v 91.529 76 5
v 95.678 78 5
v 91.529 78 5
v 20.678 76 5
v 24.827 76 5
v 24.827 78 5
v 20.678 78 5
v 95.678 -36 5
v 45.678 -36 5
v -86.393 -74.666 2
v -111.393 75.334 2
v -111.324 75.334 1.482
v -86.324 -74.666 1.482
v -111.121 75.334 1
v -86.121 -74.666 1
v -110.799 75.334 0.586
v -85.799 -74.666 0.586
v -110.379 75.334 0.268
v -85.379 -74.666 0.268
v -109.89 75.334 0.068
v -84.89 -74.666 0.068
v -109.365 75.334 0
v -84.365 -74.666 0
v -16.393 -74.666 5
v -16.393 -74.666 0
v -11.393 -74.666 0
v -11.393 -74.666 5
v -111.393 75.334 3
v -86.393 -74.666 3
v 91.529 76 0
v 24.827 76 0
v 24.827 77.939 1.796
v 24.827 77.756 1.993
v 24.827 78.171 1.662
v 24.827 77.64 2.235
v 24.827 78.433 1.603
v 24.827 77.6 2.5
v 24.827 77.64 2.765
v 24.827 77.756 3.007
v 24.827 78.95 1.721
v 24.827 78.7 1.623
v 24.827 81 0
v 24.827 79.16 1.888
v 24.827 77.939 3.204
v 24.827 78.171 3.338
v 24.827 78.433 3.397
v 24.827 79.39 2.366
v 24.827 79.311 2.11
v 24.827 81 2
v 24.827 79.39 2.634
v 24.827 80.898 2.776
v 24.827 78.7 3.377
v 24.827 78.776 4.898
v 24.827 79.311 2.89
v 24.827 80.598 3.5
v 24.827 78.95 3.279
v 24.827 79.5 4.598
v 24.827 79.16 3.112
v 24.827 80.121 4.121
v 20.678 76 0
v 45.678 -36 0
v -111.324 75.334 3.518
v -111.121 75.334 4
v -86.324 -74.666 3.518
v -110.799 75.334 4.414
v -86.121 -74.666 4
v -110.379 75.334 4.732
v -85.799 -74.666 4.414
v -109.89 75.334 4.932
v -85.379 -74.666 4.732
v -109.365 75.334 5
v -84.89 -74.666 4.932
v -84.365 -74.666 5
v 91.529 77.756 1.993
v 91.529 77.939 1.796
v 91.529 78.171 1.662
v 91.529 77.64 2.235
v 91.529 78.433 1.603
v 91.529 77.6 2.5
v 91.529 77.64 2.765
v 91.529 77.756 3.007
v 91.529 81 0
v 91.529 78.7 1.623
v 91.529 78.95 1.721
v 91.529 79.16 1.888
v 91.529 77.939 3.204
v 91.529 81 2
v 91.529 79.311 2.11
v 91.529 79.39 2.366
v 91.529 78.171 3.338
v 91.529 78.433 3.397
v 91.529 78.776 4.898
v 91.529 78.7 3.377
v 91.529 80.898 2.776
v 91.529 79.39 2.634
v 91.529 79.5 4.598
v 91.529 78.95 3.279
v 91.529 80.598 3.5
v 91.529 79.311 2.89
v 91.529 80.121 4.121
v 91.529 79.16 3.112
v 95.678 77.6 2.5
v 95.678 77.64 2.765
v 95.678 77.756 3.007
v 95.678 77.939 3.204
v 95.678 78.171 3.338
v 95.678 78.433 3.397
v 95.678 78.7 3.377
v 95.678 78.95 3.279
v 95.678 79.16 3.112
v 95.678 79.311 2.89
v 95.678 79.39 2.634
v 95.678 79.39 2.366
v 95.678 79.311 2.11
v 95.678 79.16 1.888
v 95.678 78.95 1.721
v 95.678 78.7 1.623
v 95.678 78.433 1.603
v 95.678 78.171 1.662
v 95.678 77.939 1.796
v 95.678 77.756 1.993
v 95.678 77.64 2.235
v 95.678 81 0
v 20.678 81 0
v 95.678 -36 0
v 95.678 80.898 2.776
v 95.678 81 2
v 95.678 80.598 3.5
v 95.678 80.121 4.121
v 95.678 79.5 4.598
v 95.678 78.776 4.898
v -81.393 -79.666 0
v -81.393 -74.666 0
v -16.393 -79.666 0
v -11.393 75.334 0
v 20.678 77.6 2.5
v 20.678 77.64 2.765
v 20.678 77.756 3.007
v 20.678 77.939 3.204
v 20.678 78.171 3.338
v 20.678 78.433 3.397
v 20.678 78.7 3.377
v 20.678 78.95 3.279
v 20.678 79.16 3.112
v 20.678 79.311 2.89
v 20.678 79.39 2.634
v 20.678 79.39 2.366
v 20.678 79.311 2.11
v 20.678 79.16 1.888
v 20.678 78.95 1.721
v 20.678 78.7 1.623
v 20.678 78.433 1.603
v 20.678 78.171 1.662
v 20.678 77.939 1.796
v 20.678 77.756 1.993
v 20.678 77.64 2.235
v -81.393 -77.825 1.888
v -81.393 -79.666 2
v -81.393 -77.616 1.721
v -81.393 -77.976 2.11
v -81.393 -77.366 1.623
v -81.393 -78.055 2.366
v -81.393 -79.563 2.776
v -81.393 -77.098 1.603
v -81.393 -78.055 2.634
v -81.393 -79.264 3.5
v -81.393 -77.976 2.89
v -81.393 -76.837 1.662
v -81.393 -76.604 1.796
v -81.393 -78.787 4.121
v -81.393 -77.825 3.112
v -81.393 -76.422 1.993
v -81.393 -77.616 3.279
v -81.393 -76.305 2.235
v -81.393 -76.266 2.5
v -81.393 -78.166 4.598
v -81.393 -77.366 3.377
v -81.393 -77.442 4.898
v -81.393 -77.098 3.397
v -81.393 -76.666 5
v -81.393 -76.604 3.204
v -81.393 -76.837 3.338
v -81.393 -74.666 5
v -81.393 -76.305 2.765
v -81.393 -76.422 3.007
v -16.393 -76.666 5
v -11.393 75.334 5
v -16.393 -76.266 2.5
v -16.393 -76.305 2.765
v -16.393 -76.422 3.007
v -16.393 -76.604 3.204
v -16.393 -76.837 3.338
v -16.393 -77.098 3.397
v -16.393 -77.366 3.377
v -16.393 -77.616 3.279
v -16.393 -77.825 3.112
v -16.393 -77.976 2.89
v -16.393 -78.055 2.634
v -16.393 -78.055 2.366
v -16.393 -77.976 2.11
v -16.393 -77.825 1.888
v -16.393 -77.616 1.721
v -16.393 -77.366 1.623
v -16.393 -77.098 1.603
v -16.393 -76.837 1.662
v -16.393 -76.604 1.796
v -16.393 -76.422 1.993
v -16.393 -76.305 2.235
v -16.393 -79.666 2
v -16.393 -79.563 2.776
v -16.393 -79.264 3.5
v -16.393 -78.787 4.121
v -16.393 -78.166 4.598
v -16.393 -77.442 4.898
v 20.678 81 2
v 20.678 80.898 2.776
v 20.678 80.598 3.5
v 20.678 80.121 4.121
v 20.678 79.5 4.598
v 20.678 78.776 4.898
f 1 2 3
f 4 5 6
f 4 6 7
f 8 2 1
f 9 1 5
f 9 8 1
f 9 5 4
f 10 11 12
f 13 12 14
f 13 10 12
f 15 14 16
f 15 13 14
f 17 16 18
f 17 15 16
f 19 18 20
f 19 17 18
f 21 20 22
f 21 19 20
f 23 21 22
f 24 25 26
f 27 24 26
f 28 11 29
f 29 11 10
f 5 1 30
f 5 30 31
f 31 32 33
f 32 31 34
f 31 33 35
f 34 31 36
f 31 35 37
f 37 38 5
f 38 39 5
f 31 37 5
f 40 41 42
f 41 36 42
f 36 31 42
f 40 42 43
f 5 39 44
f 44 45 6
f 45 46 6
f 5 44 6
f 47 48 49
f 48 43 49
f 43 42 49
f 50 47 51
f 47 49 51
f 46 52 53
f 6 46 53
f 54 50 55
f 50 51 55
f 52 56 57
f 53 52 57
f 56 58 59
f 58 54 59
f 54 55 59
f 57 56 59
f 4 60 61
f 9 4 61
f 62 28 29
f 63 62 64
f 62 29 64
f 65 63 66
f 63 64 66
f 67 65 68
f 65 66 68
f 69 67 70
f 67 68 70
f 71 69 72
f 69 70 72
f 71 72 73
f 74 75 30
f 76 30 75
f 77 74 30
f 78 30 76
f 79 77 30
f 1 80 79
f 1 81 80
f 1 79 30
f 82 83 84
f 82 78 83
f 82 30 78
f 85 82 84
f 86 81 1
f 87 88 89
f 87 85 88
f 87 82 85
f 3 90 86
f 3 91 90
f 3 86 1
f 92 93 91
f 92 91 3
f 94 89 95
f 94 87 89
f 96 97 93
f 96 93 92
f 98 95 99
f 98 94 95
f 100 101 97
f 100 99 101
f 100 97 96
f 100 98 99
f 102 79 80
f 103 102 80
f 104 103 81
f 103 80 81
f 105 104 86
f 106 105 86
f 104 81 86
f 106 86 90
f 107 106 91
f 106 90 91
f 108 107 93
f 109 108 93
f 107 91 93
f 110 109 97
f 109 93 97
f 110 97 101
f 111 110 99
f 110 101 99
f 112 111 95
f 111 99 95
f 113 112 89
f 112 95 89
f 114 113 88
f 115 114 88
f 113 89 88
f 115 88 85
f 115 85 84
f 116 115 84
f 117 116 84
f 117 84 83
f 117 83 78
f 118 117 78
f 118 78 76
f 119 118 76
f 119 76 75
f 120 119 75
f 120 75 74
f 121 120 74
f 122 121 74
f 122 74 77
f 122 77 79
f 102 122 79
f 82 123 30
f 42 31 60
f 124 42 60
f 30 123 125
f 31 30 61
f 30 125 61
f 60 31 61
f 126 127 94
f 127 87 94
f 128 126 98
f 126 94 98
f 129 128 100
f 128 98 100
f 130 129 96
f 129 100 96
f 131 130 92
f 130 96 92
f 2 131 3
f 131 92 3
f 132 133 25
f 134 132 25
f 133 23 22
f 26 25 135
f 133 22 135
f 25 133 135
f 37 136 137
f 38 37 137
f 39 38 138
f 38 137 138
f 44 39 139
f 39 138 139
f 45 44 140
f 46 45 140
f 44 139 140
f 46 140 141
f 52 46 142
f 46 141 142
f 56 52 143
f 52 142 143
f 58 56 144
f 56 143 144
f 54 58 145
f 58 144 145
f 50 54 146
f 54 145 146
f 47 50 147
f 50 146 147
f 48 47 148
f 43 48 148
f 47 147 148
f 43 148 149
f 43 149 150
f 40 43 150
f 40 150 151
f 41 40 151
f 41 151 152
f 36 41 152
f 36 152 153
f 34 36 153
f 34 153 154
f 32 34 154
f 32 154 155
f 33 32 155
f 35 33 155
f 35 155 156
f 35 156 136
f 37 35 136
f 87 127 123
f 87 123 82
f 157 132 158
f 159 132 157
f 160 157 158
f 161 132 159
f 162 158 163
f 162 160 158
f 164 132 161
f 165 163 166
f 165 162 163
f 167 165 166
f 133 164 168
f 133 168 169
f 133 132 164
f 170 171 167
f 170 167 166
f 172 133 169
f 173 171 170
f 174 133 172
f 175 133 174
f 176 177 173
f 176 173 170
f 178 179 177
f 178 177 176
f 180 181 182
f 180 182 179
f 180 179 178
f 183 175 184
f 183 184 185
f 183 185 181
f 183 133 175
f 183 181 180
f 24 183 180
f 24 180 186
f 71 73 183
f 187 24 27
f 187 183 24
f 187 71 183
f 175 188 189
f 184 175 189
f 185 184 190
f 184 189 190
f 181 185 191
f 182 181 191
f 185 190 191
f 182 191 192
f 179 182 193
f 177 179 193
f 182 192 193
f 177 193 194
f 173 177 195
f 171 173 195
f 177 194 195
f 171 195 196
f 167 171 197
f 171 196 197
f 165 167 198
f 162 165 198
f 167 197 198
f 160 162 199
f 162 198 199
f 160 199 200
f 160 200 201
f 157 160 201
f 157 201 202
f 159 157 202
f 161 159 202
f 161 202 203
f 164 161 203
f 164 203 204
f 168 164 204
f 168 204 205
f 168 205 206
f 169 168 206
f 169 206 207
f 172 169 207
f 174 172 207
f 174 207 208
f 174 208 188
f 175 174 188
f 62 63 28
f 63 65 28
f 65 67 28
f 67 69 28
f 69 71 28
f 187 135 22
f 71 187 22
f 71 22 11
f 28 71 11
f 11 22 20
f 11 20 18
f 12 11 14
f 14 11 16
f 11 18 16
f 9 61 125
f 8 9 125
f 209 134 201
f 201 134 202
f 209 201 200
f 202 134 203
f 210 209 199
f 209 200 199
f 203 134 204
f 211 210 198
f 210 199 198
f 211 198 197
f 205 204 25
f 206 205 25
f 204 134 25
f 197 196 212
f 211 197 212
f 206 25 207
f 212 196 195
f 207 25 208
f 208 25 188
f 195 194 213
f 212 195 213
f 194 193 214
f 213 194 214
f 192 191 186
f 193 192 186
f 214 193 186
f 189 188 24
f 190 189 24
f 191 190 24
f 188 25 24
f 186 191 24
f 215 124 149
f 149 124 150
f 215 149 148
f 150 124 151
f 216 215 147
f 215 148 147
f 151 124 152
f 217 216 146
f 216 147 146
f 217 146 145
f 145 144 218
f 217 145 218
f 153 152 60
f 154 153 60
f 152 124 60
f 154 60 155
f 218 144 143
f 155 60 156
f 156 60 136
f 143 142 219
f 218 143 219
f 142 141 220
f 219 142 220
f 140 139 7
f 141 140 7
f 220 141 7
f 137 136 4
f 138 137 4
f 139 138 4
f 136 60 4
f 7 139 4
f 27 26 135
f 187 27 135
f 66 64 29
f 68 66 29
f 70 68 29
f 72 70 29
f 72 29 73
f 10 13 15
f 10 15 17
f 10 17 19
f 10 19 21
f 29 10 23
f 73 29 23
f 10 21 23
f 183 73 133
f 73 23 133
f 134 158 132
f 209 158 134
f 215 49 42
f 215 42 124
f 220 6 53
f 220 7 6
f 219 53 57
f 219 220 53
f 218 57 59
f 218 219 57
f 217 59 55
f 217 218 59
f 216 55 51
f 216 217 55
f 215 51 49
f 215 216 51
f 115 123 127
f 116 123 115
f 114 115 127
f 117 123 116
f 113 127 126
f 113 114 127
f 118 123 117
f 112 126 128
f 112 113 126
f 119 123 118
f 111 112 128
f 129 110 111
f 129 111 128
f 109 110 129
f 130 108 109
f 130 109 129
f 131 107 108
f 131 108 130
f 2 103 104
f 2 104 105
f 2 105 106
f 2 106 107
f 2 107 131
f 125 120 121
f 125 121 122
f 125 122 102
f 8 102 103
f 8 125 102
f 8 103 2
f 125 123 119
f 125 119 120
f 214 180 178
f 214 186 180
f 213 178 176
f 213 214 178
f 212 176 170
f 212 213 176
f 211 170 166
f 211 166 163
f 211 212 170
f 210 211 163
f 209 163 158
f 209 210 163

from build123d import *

# Parameters (mm, degrees)
F0_W      = 25
F0_H      = 112
F1_DEPTH  = 5
F2_W      = 25
F2_H      = 150
F3_DEPTH  = 5
F4_R      = 2
F5_W      = 75
F5_H      = 5
F6_DEPTH  = 5
F7_W      = 65
F7_H      = 5
F8_DEPTH  = 5
F9_W      = 66.702231
F9_H      = 7.951083
F10_DEPTH = 5
F11_R     = 0.9
F12_DEPTH = 100
F13_R     = 0.9
F14_DEPTH = 125
F15_R     = 3
F15_2_R   = 3


with BuildPart() as f1:
    # F0 (on Top) → F1 (new body)
    with BuildSketch(Plane.XY):
        Polygon((20.677915, 75.999999), (45.677915, -36.000001), (70.677915, -36.000001), (70.677915, 75.999999), align=None)
        with Locations((83.177915, 19.999999)):
            Rectangle(F0_W, F0_H)
    extrude(amount=F1_DEPTH)

    # F5 (on face) → F6 (join)
    with BuildSketch(Plane(origin=(0, 75.999999, 0), x_dir=(-1, 0, 0), z_dir=(0, 1, 0))):
        with Locations((-58.177915, 2.5)):
            Rectangle(F5_W, F5_H)
    extrude(amount=F6_DEPTH)

    # F9 (on face) → F10 (cut)
    with BuildSketch(Plane(origin=(0, 80.999999, 0), x_dir=(-1, 0, 0), z_dir=(0, 1, 0))):
        with Locations((-58.177915, 3.814935)):
            Rectangle(F9_W, F9_H)
    extrude(amount=-F10_DEPTH, mode=Mode.SUBTRACT)

    # F13 (on face) → F14 (cut)
    with BuildSketch(Plane(origin=(20.677915, 0, 0), x_dir=(0, -1, 0), z_dir=(-1, 0, 0))):
        with Locations((-78.499999, 2.5)):
            Circle(F13_R)
    extrude(amount=-F14_DEPTH, mode=Mode.SUBTRACT)

    # F15
    f15_edges = [f1.edges().sort_by_distance(p)[0] for p in [
        (22.752357, 80.999999, 5),
        (93.603473, 80.999999, 5),
    ]]
    fillet(f15_edges, radius=F15_R)


with BuildPart() as f3:
    # F2 (on Top) → F3 (new body)
    with BuildSketch(Plane.XY):
        Polygon((-36.392649, 75.334491), (-111.392649, 75.334491), (-86.392649, -74.665509), (-36.392649, -74.665509), align=None)
        with Locations((-23.892649, 0.334491)):
            Rectangle(F2_W, F2_H)
    extrude(amount=F3_DEPTH)

    # F4
    f4_edges = [f3.edges().sort_by_distance(p)[0] for p in [
        (-98.892649, 0.334491, 5),
        (-98.892649, 0.334491, 0),
    ]]
    fillet(f4_edges, radius=F4_R)

    # F7 (on face) → F8 (join)
    with BuildSketch(Plane.XZ.offset(74.665509)):
        with Locations((-48.892649, 2.5)):
            Rectangle(F7_W, F7_H)
    extrude(amount=F8_DEPTH)

    # F11 (on face) → F12 (cut)
    with BuildSketch(Plane.YZ.offset(-16.392649)):
        with Locations((-77.165509, 2.5)):
            Circle(F11_R)
    extrude(amount=-F12_DEPTH, mode=Mode.SUBTRACT)

    # F15#2
    f15_2_edges = [f3.edges().sort_by_distance(p)[0] for p in [
        (-48.892649, -79.665509, 5),
    ]]
    fillet(f15_2_edges, radius=F15_2_R)


solid = Compound([f1.part, f3.part])
